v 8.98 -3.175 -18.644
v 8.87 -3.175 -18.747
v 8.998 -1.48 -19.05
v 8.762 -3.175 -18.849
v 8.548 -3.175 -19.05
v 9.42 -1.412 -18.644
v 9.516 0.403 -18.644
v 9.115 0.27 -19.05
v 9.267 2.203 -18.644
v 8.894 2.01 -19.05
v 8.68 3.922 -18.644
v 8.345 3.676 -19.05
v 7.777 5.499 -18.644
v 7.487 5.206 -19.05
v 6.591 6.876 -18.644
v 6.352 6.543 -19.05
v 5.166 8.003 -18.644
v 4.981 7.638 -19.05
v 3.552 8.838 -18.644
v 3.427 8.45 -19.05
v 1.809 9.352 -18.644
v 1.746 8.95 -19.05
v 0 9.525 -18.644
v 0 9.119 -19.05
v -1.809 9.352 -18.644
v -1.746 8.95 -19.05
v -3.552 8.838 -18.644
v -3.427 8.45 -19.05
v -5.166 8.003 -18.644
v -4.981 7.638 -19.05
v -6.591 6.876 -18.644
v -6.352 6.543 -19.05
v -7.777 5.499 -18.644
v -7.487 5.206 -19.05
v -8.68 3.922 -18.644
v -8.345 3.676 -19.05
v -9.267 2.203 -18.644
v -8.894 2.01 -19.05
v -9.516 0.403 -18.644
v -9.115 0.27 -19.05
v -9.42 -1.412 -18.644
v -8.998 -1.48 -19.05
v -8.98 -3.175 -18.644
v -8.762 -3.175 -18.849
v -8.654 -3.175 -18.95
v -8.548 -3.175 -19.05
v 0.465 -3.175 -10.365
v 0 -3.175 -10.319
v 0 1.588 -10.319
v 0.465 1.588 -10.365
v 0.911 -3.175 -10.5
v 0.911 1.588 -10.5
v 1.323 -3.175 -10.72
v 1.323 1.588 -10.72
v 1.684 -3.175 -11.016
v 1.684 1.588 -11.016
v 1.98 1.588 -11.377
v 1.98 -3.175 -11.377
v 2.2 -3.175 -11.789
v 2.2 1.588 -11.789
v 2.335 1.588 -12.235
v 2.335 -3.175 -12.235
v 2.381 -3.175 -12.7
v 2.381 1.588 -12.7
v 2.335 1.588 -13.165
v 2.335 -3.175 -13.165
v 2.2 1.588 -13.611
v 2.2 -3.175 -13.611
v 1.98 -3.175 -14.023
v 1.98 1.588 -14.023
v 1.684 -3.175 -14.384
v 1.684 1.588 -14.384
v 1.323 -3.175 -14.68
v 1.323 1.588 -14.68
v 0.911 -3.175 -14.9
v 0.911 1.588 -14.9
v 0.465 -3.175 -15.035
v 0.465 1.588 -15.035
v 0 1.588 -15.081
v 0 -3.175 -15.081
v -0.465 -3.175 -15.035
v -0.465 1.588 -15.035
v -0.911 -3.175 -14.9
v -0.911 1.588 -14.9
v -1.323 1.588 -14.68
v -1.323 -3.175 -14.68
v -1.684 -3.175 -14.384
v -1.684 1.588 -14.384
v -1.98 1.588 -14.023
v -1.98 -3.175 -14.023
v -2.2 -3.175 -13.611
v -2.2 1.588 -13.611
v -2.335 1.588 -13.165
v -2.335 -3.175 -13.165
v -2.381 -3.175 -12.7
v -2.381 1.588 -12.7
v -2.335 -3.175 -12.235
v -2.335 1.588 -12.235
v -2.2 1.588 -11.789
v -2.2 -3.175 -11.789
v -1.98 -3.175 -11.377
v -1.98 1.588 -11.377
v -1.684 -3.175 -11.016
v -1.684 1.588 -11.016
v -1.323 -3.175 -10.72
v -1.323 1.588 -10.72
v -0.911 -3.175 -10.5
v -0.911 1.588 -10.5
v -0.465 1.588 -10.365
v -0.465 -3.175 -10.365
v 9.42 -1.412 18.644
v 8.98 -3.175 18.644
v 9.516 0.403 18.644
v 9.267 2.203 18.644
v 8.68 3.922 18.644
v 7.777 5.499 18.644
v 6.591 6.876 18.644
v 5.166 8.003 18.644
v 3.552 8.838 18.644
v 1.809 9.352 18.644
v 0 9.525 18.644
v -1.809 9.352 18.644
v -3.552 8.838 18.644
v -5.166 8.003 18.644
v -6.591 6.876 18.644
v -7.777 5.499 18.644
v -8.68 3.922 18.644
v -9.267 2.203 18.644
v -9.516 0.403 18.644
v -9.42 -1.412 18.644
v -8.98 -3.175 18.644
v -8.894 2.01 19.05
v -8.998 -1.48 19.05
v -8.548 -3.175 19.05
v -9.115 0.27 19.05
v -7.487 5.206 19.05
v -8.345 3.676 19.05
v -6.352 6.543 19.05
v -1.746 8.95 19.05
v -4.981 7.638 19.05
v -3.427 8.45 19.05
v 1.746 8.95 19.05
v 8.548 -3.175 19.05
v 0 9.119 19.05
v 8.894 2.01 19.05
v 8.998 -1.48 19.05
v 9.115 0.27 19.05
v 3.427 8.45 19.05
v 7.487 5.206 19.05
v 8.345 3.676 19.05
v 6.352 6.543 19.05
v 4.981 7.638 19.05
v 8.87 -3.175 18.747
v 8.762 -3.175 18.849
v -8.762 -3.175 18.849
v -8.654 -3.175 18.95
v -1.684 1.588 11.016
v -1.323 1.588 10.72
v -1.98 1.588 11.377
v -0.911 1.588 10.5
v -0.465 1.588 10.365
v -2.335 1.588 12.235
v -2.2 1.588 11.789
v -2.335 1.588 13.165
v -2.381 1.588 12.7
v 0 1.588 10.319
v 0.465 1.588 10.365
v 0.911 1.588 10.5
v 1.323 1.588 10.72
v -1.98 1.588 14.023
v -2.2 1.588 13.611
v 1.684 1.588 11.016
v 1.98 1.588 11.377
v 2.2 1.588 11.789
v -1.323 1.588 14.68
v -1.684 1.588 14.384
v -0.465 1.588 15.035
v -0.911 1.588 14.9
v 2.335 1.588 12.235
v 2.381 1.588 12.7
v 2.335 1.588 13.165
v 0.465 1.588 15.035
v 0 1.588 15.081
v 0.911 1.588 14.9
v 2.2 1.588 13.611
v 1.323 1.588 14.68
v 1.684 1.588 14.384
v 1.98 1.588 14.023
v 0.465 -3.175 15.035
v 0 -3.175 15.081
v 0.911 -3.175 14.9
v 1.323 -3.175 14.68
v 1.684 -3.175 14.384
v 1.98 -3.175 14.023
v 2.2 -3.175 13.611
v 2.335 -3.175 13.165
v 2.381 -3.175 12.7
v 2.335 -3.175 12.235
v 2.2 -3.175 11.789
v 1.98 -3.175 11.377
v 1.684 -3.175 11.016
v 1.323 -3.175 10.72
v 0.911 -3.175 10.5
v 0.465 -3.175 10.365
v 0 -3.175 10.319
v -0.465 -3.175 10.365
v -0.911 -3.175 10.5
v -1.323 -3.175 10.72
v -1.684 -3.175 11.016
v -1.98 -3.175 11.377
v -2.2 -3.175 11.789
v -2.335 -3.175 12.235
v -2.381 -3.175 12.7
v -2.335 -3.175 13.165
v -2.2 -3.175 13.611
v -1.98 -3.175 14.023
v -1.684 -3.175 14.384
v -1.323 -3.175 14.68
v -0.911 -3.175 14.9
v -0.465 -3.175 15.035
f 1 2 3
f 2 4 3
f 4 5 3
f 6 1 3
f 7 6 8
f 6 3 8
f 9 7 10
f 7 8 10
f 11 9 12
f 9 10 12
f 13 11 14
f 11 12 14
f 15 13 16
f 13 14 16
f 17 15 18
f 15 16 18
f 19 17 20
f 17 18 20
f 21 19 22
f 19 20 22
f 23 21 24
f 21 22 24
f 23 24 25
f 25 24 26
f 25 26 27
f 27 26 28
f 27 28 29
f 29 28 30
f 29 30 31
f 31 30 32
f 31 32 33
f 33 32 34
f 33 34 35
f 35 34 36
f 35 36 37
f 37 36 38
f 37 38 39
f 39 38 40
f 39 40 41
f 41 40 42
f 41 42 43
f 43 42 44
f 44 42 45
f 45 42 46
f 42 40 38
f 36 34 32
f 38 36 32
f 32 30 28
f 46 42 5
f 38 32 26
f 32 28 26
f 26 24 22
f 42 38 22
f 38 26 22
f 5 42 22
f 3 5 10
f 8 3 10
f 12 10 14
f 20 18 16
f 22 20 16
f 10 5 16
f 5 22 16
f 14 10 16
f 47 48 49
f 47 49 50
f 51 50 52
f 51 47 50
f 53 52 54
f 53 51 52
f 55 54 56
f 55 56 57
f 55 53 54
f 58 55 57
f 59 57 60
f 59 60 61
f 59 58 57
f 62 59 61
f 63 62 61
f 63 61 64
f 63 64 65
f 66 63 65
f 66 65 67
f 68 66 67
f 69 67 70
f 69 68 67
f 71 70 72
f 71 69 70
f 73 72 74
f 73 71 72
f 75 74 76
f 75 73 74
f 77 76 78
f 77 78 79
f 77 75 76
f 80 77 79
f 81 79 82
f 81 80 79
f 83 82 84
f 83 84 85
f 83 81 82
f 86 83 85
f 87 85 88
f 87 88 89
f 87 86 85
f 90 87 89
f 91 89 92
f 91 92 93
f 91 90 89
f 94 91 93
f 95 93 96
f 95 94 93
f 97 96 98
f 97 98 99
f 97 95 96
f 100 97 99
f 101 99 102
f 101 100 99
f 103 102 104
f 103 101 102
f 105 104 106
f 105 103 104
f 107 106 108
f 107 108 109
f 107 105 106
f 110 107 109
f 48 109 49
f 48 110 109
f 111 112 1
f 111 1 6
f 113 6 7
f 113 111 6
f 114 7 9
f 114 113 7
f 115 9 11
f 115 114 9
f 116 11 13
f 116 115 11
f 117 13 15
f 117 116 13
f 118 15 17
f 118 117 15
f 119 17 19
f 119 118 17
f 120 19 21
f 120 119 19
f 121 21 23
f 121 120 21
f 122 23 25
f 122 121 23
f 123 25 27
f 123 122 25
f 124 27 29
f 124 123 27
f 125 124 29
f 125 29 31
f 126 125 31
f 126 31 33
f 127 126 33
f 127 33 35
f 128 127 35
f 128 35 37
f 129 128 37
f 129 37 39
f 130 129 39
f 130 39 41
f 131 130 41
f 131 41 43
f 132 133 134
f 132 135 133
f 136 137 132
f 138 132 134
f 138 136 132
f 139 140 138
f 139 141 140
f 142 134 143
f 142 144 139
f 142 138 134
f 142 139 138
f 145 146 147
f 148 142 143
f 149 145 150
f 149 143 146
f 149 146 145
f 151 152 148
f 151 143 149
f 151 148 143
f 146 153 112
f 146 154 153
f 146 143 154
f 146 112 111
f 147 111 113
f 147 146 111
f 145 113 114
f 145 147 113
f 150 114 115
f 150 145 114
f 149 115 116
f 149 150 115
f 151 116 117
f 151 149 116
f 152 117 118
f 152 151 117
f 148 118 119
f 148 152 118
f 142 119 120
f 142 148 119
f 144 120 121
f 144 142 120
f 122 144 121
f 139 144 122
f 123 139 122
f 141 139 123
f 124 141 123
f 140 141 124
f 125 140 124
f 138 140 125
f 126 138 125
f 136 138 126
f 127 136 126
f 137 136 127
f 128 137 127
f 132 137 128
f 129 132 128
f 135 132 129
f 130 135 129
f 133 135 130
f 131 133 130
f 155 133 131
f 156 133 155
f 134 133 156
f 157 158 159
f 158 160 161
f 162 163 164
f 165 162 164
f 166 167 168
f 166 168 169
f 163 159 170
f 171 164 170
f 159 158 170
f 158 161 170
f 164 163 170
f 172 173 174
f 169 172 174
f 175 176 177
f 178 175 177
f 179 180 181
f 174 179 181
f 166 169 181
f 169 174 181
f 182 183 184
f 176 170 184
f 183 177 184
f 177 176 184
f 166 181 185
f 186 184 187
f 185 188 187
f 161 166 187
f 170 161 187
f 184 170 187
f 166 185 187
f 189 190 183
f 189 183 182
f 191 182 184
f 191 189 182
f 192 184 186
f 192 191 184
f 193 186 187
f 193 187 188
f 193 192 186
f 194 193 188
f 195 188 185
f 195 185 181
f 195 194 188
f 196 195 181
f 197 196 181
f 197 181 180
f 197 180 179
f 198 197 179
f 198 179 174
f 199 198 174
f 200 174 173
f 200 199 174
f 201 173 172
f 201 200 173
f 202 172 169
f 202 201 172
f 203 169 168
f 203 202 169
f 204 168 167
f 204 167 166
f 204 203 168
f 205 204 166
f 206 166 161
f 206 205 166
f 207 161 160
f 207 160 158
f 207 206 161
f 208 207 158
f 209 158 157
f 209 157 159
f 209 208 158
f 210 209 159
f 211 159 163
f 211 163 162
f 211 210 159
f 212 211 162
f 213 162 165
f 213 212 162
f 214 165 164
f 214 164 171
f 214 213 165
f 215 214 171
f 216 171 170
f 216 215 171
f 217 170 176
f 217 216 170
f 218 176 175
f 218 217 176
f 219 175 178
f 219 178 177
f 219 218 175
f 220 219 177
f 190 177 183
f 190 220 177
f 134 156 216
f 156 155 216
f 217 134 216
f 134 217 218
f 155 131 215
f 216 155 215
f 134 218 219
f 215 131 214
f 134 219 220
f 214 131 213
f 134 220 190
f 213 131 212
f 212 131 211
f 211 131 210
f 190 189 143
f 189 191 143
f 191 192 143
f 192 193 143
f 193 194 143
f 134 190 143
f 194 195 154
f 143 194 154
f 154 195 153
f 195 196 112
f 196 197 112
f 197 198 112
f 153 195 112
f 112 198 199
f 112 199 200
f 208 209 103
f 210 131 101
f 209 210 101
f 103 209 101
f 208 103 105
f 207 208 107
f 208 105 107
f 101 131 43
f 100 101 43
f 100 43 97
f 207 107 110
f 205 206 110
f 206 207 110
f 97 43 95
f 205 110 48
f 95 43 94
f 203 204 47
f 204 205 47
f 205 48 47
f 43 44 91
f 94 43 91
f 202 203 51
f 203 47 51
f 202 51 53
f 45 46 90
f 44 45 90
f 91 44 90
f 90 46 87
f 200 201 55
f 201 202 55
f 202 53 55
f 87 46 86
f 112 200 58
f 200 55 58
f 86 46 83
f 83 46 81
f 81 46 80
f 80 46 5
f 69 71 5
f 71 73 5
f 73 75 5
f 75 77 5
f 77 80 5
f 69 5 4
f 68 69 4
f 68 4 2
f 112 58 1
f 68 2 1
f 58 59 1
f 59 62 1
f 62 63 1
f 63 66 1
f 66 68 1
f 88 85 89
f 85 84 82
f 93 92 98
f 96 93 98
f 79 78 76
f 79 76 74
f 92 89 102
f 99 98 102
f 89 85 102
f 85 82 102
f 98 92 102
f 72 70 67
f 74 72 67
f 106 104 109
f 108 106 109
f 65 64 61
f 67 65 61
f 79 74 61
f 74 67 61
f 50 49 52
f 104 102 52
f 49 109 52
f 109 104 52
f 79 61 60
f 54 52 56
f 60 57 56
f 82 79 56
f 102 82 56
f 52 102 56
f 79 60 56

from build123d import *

# Parameters (mm, degrees)
SKETCH1_R            = 9.525
EXTRUDE1_DEPTH       = 19.05
CHAMFER1_SIZE        = 0.4064
TRUNCATED_DEPTH      = 20.05
TRUNCATED_DEPTH_BACK = 20.05
SKETCH6_R            = 2.38125
BLIND_HOLES_DEPTH    = 4.7625


with BuildPart() as part:
    # Sketch1 → Extrude1 (new body, symmetric)
    with BuildSketch(Plane.XY):
        Circle(SKETCH1_R)
    extrude(amount=EXTRUDE1_DEPTH, both=True)

    # Chamfer1
    chamfer1_edges = [part.edges().sort_by_distance(p)[0] for p in [
        (-9.525, 0, -19.05),
        (-9.525, 0, 19.05),
    ]]
    chamfer(chamfer1_edges, length=CHAMFER1_SIZE)

    # Sketch2 → Truncated (cut, two sides)
    with BuildSketch(Plane.XY) as truncated_sk:
        with BuildLine():
            Line((-8.980256121, -3.175), (8.980256121, -3.175))
            ThreePointArc((8.980256121, -3.175), (0, -9.525), (-8.980256121, -3.175))
        make_face()
    extrude(amount=TRUNCATED_DEPTH, mode=Mode.SUBTRACT)
    extrude(truncated_sk.sketch, amount=-TRUNCATED_DEPTH_BACK, mode=Mode.SUBTRACT)

    # Sketch6 → Blind Holes (cut)
    with BuildSketch(Plane(origin=(0, -3.175, 0), x_dir=(-1, 0, 0), z_dir=(0, 1, 0))):
        with Locations(Location((0, 12.7, 0), (0, 0, 90))):  # turned: the seam where the file's is
            Circle(SKETCH6_R)
        with Locations(Location((0, -12.7, 0), (0, 0, 90))):  # turned: the seam where the file's is
            Circle(SKETCH6_R)
    extrude(amount=BLIND_HOLES_DEPTH, mode=Mode.SUBTRACT)


solid = part.part
